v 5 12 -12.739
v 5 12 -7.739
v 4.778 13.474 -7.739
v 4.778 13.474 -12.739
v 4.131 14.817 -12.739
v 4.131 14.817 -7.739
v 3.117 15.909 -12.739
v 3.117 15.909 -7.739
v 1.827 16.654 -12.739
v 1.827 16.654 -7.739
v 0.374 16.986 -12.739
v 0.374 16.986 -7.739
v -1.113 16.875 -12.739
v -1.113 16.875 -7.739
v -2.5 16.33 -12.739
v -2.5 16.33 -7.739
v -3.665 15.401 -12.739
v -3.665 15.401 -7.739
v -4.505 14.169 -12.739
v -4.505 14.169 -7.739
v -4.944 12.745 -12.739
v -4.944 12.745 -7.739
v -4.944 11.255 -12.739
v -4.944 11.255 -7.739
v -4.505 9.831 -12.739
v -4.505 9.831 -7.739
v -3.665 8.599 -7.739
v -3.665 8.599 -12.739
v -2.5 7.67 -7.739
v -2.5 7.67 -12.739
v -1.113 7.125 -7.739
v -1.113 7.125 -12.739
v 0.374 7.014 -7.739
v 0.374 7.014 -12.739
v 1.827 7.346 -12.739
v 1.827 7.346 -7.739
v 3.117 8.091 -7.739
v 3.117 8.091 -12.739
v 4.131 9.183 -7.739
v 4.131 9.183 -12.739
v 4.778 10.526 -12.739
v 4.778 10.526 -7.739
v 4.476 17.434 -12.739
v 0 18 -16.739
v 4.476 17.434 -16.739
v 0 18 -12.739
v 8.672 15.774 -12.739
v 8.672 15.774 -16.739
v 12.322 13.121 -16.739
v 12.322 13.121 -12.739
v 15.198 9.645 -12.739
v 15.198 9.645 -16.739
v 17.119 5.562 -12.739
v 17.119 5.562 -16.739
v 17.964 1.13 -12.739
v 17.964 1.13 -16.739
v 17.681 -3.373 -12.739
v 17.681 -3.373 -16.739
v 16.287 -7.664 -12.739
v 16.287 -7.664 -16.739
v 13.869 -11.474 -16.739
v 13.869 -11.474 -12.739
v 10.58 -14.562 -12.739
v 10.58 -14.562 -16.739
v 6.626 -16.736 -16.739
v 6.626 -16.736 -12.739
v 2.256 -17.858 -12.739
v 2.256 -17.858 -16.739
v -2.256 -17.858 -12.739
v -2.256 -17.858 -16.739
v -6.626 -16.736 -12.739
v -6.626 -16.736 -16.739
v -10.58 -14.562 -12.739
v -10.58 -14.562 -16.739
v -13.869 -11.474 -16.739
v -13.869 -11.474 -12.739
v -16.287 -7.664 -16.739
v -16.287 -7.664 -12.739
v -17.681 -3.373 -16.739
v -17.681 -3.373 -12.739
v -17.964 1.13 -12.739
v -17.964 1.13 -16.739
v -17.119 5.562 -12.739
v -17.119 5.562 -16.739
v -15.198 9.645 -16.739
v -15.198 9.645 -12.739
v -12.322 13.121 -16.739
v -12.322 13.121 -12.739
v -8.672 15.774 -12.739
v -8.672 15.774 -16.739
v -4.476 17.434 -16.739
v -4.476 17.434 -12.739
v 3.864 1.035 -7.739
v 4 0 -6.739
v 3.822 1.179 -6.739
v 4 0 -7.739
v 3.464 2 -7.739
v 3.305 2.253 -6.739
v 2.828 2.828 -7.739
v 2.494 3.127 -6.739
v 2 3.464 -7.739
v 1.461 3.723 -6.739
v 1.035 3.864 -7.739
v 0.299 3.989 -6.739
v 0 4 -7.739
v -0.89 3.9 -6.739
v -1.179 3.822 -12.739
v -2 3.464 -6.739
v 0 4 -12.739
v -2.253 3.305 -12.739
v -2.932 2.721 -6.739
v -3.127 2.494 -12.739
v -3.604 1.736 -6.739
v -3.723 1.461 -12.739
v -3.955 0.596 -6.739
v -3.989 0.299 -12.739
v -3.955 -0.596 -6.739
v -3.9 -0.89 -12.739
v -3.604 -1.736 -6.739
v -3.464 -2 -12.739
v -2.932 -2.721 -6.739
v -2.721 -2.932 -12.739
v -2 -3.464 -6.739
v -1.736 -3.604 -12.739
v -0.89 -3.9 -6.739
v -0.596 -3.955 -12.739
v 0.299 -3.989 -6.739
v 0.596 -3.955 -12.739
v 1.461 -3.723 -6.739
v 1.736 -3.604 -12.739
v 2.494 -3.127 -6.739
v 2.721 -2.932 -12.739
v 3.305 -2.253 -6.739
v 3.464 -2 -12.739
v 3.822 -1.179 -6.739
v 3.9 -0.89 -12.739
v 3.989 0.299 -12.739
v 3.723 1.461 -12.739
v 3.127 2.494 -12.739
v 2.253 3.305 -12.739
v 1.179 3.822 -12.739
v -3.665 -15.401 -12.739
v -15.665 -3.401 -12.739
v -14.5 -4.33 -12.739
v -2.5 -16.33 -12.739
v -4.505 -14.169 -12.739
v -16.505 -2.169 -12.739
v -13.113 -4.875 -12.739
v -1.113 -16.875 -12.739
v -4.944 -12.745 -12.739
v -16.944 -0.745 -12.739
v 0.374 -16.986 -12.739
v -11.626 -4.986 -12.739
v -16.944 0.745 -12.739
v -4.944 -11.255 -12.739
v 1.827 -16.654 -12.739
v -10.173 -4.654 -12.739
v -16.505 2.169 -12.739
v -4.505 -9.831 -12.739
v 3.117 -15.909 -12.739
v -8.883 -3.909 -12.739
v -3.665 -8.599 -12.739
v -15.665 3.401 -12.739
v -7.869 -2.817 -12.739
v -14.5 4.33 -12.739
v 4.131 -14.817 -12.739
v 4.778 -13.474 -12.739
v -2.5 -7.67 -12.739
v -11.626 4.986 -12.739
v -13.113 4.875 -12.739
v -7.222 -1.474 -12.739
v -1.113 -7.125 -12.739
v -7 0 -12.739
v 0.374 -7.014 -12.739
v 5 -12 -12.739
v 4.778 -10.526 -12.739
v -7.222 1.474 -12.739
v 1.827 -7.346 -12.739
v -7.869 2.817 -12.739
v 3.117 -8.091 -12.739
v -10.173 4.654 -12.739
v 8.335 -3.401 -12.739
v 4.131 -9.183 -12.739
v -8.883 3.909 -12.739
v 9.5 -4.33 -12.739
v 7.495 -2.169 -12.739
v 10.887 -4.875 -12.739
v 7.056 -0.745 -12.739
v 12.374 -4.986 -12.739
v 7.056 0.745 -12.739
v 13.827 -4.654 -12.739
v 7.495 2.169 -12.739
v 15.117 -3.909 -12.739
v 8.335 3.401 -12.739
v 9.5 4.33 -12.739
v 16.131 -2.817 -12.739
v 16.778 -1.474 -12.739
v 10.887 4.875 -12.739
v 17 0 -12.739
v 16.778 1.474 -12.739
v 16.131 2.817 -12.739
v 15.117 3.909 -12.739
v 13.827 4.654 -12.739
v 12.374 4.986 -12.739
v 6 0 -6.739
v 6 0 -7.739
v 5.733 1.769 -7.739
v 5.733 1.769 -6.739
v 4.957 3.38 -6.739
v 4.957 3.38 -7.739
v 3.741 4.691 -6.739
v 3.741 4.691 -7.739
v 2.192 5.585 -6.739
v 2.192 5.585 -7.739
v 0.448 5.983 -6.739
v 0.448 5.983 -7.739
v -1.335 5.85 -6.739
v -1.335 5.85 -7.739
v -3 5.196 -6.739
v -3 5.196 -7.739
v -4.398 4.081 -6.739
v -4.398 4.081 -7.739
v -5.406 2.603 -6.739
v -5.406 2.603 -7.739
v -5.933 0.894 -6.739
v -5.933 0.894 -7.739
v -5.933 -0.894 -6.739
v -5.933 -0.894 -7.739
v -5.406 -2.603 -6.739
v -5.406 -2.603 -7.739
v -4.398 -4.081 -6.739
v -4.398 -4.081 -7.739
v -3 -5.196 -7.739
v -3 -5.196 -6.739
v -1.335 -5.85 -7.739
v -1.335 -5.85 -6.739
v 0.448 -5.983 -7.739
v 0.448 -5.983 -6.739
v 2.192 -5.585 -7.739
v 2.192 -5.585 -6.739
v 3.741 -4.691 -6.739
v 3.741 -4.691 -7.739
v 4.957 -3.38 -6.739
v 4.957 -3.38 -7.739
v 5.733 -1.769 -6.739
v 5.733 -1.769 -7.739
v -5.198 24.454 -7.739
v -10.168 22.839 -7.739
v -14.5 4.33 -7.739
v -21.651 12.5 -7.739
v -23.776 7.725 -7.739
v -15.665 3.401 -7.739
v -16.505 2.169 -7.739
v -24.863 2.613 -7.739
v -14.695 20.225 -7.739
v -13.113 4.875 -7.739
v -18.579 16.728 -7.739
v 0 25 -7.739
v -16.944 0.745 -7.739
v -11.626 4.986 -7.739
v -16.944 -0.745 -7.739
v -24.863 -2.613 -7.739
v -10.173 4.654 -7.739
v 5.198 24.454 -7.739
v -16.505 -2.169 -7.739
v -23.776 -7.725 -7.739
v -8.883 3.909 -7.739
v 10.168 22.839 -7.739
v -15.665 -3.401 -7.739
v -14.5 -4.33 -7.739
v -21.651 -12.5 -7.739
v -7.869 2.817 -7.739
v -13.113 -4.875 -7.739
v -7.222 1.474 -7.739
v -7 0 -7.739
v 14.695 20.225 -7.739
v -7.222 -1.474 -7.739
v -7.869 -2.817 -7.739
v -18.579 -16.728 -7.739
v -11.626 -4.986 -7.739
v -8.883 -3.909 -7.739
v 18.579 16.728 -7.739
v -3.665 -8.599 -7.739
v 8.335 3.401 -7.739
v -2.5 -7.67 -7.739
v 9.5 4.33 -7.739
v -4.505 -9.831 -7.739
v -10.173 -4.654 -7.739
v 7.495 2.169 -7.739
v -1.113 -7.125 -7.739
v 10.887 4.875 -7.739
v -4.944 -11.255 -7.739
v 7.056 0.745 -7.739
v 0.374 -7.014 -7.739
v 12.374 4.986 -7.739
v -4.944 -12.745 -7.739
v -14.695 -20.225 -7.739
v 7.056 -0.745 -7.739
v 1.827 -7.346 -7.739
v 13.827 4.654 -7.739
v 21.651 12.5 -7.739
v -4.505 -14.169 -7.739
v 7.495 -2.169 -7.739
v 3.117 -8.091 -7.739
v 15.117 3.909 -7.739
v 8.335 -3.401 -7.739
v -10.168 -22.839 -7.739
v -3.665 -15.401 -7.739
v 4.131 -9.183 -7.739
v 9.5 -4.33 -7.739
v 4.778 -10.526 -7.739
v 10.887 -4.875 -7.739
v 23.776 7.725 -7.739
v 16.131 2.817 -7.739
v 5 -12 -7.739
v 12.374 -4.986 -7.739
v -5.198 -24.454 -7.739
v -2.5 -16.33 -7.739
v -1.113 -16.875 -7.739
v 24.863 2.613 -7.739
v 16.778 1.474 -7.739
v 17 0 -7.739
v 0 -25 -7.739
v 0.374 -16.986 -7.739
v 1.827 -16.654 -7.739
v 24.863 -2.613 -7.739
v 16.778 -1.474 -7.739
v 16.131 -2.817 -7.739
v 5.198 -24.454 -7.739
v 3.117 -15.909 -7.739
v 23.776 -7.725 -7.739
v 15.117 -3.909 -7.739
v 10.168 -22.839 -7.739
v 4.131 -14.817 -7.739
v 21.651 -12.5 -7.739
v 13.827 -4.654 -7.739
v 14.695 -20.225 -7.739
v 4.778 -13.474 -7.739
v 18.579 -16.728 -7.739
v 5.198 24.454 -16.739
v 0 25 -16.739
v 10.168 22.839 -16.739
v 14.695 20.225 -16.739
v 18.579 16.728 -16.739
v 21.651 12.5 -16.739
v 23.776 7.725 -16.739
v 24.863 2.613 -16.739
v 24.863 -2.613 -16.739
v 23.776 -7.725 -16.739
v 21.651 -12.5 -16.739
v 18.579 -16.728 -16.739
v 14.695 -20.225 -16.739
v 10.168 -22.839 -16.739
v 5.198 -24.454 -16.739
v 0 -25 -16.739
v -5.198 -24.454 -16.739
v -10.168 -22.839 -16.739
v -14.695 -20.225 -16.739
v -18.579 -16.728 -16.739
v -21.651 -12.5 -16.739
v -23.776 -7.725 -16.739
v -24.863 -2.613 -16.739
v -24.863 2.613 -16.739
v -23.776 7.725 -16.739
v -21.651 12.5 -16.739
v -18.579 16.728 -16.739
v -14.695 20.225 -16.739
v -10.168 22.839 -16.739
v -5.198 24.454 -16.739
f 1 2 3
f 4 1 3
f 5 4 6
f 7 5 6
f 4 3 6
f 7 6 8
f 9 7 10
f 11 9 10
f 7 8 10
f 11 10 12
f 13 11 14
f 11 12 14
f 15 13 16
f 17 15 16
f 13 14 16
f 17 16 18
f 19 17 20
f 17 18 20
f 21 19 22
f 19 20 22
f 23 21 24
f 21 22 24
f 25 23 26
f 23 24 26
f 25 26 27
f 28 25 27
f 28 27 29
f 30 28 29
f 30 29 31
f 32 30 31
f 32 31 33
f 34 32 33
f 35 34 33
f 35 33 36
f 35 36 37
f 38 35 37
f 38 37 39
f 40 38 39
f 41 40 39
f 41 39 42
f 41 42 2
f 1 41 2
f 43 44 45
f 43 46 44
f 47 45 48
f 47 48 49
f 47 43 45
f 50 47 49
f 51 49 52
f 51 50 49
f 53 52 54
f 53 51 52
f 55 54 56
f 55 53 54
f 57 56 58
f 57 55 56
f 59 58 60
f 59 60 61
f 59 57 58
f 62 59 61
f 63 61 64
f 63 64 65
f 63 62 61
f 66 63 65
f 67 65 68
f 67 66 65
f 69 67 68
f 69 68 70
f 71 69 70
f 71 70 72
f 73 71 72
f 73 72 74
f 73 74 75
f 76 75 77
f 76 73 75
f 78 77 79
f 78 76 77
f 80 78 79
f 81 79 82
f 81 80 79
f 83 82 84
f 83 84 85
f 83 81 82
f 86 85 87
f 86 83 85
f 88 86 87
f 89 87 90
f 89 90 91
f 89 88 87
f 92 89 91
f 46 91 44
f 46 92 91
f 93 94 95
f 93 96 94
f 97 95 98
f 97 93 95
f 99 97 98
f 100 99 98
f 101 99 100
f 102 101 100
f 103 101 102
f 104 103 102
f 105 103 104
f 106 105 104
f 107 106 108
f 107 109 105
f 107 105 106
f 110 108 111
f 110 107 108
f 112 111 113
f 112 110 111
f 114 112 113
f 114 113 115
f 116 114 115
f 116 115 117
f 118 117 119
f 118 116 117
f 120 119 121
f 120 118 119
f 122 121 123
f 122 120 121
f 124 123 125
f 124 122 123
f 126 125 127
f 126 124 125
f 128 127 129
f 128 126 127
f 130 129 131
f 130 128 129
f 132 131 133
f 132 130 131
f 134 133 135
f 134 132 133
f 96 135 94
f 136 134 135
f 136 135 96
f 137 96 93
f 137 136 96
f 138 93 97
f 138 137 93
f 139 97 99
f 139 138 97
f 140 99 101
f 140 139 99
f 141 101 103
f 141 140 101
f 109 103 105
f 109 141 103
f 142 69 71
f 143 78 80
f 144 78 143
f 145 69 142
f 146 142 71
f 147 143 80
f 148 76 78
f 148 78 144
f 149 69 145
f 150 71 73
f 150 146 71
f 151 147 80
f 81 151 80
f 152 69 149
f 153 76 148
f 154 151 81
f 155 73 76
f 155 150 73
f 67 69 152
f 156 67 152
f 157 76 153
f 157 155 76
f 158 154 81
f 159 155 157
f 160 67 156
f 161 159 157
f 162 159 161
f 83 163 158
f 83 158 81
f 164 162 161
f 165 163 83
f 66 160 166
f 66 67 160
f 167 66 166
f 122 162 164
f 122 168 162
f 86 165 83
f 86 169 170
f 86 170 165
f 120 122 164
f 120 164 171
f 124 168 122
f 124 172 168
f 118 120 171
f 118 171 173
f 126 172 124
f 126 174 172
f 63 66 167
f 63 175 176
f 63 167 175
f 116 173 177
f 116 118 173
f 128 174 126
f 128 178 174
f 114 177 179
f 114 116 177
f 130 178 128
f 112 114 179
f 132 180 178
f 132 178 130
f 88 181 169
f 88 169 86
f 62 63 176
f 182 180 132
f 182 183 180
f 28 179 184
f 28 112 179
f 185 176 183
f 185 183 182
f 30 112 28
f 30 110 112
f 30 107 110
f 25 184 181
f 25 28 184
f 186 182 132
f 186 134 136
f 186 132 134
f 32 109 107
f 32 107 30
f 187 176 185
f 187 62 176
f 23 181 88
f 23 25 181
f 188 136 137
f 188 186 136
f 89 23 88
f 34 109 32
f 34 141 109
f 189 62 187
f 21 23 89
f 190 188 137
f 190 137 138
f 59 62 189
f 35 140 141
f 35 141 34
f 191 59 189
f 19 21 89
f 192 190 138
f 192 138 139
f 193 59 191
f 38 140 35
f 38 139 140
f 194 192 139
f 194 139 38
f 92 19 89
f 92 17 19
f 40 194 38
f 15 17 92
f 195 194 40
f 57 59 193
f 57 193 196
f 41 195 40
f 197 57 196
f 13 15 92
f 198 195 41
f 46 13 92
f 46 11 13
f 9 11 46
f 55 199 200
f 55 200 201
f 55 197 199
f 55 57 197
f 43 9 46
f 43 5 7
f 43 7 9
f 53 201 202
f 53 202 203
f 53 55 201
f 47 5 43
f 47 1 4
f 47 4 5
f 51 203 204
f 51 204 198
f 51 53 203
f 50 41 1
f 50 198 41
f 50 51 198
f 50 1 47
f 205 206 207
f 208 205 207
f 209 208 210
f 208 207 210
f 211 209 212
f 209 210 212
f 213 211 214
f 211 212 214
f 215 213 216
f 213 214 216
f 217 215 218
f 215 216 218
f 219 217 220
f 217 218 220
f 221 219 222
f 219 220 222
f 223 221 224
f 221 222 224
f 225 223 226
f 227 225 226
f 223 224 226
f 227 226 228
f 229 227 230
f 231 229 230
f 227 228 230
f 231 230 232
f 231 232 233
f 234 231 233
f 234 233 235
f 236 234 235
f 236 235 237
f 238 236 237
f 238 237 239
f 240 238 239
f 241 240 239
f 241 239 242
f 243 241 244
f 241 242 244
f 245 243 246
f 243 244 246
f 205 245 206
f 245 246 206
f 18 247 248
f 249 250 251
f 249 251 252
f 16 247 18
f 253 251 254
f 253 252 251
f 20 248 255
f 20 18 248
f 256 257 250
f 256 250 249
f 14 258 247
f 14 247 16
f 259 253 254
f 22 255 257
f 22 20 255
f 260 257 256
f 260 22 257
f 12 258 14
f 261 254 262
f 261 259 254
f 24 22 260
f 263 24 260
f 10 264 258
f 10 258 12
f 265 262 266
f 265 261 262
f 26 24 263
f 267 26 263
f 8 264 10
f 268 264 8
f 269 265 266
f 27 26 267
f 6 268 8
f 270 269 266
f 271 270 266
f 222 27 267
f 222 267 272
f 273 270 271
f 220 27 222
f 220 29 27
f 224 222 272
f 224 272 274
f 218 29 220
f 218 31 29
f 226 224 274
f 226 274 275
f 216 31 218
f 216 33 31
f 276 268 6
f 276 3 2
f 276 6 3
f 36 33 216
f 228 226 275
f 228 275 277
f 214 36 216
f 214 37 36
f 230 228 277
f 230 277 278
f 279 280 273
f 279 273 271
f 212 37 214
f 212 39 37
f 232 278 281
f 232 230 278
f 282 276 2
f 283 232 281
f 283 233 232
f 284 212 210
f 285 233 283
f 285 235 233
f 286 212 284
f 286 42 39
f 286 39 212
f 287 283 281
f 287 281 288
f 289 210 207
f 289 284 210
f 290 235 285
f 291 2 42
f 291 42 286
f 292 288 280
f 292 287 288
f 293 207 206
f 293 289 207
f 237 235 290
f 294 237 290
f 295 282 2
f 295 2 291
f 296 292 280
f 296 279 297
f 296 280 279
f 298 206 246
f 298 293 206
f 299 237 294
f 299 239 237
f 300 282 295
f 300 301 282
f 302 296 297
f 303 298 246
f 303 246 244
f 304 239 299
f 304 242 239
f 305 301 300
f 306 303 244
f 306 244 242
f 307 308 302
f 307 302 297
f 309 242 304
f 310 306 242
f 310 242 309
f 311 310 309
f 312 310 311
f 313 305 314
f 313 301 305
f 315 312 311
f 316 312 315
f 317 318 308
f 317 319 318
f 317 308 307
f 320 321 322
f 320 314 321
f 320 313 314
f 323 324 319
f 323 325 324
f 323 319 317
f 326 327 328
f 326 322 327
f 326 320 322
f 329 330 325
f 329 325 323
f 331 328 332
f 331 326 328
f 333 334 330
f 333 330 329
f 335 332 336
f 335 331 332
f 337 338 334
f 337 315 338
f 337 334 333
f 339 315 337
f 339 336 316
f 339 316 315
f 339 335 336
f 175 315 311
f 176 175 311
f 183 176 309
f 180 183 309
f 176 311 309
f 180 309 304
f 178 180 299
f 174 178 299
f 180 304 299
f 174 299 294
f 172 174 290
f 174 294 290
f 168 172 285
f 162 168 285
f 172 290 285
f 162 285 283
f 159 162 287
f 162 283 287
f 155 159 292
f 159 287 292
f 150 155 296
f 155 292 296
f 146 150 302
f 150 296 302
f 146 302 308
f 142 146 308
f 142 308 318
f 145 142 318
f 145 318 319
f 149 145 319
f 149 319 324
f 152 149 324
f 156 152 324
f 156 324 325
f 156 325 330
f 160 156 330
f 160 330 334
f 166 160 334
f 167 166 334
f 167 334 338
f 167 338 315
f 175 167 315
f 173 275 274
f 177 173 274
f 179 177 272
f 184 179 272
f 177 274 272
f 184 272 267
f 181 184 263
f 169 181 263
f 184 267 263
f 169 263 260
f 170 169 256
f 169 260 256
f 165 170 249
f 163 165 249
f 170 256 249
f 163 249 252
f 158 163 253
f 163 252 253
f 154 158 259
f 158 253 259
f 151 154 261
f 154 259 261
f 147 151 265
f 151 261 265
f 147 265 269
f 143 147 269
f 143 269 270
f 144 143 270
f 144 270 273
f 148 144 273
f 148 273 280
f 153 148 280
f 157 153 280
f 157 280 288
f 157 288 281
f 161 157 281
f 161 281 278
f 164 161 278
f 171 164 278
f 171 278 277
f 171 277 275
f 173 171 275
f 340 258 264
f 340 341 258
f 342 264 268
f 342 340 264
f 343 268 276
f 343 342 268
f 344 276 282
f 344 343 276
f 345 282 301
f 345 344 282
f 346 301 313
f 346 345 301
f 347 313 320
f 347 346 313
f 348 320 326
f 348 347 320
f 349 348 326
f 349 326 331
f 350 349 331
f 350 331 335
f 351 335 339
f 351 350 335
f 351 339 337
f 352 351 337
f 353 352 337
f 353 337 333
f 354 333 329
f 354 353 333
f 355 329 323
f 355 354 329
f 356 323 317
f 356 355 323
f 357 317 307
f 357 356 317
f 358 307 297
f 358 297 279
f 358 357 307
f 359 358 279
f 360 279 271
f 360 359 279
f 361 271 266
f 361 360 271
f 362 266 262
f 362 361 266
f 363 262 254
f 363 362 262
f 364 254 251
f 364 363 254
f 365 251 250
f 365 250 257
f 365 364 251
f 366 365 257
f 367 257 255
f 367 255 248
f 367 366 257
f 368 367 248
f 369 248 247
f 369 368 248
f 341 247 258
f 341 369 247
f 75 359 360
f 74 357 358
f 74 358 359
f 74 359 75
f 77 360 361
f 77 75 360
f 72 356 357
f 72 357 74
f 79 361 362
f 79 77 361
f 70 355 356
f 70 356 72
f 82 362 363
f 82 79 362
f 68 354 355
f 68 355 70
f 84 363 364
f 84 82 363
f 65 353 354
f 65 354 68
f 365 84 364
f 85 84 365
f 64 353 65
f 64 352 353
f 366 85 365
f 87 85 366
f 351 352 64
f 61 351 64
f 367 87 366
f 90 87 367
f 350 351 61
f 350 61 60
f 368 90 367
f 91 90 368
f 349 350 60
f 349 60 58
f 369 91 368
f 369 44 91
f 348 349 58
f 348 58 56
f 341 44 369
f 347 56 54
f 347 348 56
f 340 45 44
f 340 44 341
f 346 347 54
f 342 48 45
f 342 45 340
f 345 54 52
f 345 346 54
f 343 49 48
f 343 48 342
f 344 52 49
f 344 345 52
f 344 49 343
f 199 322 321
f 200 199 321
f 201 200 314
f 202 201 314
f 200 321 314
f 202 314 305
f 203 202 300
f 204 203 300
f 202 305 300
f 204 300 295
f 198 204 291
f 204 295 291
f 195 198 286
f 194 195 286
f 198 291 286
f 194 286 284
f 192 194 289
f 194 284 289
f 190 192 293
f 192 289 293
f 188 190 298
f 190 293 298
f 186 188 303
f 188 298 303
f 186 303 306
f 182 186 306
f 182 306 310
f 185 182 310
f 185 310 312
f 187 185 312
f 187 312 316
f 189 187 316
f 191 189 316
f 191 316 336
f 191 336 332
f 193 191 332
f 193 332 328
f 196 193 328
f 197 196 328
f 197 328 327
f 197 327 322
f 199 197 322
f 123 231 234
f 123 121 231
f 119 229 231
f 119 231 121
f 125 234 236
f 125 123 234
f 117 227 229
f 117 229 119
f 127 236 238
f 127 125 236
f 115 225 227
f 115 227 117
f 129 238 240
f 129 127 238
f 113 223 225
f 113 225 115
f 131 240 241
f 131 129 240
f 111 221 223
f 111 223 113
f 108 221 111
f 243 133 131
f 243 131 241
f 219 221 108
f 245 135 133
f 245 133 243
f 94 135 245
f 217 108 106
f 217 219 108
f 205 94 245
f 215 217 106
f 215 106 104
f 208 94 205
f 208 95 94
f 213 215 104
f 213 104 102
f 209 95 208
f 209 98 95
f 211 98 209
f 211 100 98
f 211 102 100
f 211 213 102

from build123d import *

# Parameters (mm, degrees)
SKETCH_2_R          = 5
CUT_EXTRUDE_1_DEPTH = 10
SKETCH_3_R          = 6
SKETCH_3_R_2        = 4
EXTRUDE_1_DEPTH     = 1


with BuildPart() as part:
    # Эскиз1 → Повернуть1 (revolve)
    with BuildSketch(Plane(origin=(0, 0, 0), x_dir=(0, 0, -1), z_dir=(1, 0, 0))):
        Polygon((7.739063178, 4), (7.739063178, 25), (16.739063178, 25), (16.739063178, 18), (12.739063178, 18), (12.739063178, 4), align=None)
    revolve(axis=Axis((0, 0, 0), (0, 0, -1)))

    # Эскиз2 → Вырез-Вытянуть1 (cut, through all)
    with BuildSketch(Plane.XY.offset(-7.739063178)):
        with Locations((0, 12)):
            Circle(SKETCH_2_R)
        with Locations((12, 0)):
            Circle(SKETCH_2_R)
        with Locations((0, -12)):
            Circle(SKETCH_2_R)
        with Locations((-12, 0)):
            Circle(SKETCH_2_R)
    extrude(amount=-CUT_EXTRUDE_1_DEPTH, mode=Mode.SUBTRACT)

    # Эскиз3 → Бобышка-Вытянуть1 (add)
    with BuildSketch(Plane.XY.offset(-7.739063178)):
        Circle(SKETCH_3_R)
        Circle(SKETCH_3_R_2, mode=Mode.SUBTRACT)
    extrude(amount=EXTRUDE_1_DEPTH)


solid = part.part
